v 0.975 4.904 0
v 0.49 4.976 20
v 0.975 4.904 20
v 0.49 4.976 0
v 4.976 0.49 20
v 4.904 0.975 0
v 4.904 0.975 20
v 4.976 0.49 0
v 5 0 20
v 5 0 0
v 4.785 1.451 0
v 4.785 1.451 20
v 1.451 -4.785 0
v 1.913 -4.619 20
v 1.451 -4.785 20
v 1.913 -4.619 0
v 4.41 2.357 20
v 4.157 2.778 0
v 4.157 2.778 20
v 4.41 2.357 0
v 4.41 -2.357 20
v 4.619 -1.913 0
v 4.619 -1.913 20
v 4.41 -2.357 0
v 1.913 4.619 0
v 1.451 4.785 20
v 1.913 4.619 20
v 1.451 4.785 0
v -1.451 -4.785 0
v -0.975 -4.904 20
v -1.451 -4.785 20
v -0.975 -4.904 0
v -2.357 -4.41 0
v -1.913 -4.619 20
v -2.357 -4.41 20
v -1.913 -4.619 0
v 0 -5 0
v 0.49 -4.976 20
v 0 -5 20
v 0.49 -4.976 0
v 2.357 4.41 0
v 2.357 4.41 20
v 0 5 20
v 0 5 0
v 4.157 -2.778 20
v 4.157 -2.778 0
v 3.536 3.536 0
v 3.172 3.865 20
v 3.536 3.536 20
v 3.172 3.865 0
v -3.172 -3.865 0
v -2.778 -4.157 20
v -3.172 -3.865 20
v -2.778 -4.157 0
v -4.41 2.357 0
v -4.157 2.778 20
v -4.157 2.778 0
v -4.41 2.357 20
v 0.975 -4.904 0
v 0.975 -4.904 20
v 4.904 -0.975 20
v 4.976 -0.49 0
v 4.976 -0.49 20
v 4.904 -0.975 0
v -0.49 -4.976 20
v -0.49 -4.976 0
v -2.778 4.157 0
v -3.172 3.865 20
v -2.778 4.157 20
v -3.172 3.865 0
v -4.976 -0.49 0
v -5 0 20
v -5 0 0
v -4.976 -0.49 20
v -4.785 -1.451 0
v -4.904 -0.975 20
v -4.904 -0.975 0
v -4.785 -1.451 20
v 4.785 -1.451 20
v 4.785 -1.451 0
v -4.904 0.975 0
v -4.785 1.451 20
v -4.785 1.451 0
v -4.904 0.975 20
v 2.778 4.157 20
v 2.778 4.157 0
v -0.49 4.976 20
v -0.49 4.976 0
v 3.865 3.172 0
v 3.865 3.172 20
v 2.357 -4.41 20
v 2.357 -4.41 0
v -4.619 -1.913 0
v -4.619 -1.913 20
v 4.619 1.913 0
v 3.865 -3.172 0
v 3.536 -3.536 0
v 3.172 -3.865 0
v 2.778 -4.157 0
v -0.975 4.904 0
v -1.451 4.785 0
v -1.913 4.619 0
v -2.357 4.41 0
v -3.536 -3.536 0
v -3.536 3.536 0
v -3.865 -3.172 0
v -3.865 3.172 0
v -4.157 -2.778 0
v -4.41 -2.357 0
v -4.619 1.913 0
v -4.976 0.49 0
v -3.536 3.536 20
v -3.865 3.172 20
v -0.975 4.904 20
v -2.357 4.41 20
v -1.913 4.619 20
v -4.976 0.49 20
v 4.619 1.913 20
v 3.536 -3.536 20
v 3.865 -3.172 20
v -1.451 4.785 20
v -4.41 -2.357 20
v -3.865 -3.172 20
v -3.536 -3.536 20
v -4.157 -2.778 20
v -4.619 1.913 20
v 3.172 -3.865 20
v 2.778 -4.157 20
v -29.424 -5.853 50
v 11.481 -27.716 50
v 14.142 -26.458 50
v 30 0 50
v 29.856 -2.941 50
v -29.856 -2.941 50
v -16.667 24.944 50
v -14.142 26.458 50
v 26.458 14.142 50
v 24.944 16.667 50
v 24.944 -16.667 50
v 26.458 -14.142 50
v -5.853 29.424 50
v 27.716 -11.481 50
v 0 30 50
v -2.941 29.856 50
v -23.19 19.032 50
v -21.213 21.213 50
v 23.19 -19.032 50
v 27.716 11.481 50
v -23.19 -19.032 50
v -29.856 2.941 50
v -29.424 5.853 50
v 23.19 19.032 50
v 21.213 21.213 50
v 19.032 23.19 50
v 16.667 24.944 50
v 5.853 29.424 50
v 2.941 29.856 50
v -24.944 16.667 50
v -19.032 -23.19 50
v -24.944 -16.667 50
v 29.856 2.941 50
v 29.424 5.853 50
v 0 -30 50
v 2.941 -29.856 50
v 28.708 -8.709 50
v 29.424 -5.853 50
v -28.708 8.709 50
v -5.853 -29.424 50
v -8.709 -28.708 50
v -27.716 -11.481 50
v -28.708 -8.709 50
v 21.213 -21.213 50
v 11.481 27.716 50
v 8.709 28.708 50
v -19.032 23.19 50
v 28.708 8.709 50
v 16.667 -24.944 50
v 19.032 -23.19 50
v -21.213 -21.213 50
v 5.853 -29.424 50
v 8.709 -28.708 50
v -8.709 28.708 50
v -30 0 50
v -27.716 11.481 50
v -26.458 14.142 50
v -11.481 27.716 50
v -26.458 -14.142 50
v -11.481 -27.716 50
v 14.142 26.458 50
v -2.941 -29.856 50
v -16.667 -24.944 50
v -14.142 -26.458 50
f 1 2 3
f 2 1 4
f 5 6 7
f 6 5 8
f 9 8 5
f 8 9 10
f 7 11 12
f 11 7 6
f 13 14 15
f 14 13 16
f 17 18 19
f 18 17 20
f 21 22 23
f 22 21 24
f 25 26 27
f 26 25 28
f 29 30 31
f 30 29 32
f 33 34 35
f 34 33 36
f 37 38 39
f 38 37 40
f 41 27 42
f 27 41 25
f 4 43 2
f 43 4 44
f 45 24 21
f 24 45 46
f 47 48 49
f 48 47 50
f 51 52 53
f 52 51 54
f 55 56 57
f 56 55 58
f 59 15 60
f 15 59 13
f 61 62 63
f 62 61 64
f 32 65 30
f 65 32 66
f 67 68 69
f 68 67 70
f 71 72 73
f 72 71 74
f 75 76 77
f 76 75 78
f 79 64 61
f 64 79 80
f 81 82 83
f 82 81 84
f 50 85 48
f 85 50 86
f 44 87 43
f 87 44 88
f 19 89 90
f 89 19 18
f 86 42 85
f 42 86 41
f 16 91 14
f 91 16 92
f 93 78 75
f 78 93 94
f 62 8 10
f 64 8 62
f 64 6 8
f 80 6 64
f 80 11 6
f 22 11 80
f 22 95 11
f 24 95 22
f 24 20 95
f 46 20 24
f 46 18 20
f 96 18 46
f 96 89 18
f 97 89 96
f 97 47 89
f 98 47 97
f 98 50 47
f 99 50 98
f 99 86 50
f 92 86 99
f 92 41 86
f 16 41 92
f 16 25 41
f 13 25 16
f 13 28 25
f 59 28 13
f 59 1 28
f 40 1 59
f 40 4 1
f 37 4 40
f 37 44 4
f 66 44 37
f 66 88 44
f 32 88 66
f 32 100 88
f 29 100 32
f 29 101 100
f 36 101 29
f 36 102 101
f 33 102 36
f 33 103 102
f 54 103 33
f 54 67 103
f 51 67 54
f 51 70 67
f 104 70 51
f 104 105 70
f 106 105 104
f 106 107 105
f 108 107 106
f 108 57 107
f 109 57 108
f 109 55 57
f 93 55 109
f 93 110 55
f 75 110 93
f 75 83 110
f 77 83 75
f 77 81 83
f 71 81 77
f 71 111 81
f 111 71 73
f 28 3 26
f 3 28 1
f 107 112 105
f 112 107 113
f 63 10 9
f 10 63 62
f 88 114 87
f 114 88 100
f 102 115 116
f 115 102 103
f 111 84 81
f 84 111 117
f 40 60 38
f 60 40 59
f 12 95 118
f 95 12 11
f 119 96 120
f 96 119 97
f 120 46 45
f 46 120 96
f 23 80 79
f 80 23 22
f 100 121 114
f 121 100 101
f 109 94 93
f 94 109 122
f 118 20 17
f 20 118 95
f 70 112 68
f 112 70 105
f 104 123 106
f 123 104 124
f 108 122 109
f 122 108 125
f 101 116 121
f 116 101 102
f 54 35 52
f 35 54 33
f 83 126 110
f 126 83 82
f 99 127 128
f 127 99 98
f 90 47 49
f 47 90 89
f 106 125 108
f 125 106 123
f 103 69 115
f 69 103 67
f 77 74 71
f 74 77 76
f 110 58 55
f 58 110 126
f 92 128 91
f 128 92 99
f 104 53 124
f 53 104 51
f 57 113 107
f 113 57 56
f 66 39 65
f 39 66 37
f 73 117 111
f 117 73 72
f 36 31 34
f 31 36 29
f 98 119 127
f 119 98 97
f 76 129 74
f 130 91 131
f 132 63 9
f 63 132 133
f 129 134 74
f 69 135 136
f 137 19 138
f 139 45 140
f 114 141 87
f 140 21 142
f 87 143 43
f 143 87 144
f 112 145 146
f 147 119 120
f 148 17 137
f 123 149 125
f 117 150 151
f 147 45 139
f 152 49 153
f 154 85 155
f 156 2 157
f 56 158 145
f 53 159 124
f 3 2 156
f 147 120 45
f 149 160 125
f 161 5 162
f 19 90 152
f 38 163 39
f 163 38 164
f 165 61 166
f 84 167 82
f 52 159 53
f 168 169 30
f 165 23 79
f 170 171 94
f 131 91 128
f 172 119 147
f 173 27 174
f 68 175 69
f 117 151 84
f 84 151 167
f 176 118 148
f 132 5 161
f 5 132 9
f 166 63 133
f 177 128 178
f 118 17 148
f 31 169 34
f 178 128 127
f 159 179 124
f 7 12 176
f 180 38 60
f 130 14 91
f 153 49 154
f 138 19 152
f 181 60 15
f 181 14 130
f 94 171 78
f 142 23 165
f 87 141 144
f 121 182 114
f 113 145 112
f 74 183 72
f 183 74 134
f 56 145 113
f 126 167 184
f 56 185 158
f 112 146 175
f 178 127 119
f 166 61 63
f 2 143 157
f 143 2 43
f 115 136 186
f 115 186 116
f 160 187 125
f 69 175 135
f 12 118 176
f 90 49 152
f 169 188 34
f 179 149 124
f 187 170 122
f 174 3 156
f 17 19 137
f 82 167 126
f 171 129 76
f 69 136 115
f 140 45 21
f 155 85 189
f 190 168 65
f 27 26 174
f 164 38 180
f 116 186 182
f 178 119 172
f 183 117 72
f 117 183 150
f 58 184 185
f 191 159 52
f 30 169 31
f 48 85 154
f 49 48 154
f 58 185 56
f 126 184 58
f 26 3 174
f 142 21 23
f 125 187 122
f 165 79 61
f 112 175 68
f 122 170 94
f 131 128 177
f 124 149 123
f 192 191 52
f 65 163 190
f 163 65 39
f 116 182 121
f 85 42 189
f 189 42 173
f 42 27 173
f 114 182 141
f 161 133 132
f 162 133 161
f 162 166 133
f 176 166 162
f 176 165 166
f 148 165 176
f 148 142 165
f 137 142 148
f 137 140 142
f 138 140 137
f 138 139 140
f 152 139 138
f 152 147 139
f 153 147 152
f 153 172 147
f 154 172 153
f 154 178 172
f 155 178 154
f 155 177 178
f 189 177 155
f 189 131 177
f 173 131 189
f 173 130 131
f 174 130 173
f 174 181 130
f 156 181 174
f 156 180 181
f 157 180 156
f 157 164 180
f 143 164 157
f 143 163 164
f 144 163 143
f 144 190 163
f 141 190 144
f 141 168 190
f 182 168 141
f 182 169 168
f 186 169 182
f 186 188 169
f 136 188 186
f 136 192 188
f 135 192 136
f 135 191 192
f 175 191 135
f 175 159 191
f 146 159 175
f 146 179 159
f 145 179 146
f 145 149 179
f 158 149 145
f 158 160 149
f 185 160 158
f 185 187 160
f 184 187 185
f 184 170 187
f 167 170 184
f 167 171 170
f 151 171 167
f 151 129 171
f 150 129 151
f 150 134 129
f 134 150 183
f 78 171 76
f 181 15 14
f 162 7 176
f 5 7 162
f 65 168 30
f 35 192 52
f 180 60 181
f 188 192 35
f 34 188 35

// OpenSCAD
// Lab Funnel Design
// Wall thickness: 1.6 mm
// Spout: 10 mm outer diameter, 20 mm tall (z = 0 to z = 20)
// Cone: expands from 10 mm outer diameter at z = 20 to 60 mm outer diameter at z = 50
// Open at top and bottom for liquid flow

$fn = 64;

// Dimensions
wall_thickness = 1.6;
spout_outer_diameter = 10;
spout_height = 20;
cone_top_diameter = 10;
cone_bottom_diameter = 60;
cone_height = 30; // from z=20 to z=50

// Calculate inner diameters
spout_inner_diameter = spout_outer_diameter - 2 * wall_thickness;
cone_top_inner_diameter = cone_top_diameter - 2 * wall_thickness;
cone_bottom_inner_diameter = cone_bottom_diameter - 2 * wall_thickness;

// Spout (outer cylinder)
module spout_outer() {
    translate([0, 0, 0])
    cylinder(h = spout_height, d = spout_outer_diameter, center = false);
}

// Spout (inner cylinder - for hollowing)
module spout_inner() {
    translate([0, 0, -0.01])
    cylinder(h = spout_height + 0.02, d = spout_inner_diameter, center = false);
}

// Cone (outer cone)
module cone_outer() {
    translate([0, 0, spout_height])
    cylinder(h = cone_height, 
             d1 = cone_top_diameter, 
             d2 = cone_bottom_diameter, 
             center = false);
}

// Cone (inner cone - for hollowing)
module cone_inner() {
    translate([0, 0, spout_height - 0.01])
    cylinder(h = cone_height + 0.02, 
             d1 = cone_top_inner_diameter, 
             d2 = cone_bottom_inner_diameter, 
             center = false);
}

// Build the funnel - correct approach
module funnel() {
    // Create the outer shape
    union() {
        spout_outer();
        cone_outer();
    }
    
    // Subtract the inner hollow from the outer shape
    difference() {
        union() {
            spout_outer();
            cone_outer();
        }
        spout_inner();
        cone_inner();
    }
}

funnel();
